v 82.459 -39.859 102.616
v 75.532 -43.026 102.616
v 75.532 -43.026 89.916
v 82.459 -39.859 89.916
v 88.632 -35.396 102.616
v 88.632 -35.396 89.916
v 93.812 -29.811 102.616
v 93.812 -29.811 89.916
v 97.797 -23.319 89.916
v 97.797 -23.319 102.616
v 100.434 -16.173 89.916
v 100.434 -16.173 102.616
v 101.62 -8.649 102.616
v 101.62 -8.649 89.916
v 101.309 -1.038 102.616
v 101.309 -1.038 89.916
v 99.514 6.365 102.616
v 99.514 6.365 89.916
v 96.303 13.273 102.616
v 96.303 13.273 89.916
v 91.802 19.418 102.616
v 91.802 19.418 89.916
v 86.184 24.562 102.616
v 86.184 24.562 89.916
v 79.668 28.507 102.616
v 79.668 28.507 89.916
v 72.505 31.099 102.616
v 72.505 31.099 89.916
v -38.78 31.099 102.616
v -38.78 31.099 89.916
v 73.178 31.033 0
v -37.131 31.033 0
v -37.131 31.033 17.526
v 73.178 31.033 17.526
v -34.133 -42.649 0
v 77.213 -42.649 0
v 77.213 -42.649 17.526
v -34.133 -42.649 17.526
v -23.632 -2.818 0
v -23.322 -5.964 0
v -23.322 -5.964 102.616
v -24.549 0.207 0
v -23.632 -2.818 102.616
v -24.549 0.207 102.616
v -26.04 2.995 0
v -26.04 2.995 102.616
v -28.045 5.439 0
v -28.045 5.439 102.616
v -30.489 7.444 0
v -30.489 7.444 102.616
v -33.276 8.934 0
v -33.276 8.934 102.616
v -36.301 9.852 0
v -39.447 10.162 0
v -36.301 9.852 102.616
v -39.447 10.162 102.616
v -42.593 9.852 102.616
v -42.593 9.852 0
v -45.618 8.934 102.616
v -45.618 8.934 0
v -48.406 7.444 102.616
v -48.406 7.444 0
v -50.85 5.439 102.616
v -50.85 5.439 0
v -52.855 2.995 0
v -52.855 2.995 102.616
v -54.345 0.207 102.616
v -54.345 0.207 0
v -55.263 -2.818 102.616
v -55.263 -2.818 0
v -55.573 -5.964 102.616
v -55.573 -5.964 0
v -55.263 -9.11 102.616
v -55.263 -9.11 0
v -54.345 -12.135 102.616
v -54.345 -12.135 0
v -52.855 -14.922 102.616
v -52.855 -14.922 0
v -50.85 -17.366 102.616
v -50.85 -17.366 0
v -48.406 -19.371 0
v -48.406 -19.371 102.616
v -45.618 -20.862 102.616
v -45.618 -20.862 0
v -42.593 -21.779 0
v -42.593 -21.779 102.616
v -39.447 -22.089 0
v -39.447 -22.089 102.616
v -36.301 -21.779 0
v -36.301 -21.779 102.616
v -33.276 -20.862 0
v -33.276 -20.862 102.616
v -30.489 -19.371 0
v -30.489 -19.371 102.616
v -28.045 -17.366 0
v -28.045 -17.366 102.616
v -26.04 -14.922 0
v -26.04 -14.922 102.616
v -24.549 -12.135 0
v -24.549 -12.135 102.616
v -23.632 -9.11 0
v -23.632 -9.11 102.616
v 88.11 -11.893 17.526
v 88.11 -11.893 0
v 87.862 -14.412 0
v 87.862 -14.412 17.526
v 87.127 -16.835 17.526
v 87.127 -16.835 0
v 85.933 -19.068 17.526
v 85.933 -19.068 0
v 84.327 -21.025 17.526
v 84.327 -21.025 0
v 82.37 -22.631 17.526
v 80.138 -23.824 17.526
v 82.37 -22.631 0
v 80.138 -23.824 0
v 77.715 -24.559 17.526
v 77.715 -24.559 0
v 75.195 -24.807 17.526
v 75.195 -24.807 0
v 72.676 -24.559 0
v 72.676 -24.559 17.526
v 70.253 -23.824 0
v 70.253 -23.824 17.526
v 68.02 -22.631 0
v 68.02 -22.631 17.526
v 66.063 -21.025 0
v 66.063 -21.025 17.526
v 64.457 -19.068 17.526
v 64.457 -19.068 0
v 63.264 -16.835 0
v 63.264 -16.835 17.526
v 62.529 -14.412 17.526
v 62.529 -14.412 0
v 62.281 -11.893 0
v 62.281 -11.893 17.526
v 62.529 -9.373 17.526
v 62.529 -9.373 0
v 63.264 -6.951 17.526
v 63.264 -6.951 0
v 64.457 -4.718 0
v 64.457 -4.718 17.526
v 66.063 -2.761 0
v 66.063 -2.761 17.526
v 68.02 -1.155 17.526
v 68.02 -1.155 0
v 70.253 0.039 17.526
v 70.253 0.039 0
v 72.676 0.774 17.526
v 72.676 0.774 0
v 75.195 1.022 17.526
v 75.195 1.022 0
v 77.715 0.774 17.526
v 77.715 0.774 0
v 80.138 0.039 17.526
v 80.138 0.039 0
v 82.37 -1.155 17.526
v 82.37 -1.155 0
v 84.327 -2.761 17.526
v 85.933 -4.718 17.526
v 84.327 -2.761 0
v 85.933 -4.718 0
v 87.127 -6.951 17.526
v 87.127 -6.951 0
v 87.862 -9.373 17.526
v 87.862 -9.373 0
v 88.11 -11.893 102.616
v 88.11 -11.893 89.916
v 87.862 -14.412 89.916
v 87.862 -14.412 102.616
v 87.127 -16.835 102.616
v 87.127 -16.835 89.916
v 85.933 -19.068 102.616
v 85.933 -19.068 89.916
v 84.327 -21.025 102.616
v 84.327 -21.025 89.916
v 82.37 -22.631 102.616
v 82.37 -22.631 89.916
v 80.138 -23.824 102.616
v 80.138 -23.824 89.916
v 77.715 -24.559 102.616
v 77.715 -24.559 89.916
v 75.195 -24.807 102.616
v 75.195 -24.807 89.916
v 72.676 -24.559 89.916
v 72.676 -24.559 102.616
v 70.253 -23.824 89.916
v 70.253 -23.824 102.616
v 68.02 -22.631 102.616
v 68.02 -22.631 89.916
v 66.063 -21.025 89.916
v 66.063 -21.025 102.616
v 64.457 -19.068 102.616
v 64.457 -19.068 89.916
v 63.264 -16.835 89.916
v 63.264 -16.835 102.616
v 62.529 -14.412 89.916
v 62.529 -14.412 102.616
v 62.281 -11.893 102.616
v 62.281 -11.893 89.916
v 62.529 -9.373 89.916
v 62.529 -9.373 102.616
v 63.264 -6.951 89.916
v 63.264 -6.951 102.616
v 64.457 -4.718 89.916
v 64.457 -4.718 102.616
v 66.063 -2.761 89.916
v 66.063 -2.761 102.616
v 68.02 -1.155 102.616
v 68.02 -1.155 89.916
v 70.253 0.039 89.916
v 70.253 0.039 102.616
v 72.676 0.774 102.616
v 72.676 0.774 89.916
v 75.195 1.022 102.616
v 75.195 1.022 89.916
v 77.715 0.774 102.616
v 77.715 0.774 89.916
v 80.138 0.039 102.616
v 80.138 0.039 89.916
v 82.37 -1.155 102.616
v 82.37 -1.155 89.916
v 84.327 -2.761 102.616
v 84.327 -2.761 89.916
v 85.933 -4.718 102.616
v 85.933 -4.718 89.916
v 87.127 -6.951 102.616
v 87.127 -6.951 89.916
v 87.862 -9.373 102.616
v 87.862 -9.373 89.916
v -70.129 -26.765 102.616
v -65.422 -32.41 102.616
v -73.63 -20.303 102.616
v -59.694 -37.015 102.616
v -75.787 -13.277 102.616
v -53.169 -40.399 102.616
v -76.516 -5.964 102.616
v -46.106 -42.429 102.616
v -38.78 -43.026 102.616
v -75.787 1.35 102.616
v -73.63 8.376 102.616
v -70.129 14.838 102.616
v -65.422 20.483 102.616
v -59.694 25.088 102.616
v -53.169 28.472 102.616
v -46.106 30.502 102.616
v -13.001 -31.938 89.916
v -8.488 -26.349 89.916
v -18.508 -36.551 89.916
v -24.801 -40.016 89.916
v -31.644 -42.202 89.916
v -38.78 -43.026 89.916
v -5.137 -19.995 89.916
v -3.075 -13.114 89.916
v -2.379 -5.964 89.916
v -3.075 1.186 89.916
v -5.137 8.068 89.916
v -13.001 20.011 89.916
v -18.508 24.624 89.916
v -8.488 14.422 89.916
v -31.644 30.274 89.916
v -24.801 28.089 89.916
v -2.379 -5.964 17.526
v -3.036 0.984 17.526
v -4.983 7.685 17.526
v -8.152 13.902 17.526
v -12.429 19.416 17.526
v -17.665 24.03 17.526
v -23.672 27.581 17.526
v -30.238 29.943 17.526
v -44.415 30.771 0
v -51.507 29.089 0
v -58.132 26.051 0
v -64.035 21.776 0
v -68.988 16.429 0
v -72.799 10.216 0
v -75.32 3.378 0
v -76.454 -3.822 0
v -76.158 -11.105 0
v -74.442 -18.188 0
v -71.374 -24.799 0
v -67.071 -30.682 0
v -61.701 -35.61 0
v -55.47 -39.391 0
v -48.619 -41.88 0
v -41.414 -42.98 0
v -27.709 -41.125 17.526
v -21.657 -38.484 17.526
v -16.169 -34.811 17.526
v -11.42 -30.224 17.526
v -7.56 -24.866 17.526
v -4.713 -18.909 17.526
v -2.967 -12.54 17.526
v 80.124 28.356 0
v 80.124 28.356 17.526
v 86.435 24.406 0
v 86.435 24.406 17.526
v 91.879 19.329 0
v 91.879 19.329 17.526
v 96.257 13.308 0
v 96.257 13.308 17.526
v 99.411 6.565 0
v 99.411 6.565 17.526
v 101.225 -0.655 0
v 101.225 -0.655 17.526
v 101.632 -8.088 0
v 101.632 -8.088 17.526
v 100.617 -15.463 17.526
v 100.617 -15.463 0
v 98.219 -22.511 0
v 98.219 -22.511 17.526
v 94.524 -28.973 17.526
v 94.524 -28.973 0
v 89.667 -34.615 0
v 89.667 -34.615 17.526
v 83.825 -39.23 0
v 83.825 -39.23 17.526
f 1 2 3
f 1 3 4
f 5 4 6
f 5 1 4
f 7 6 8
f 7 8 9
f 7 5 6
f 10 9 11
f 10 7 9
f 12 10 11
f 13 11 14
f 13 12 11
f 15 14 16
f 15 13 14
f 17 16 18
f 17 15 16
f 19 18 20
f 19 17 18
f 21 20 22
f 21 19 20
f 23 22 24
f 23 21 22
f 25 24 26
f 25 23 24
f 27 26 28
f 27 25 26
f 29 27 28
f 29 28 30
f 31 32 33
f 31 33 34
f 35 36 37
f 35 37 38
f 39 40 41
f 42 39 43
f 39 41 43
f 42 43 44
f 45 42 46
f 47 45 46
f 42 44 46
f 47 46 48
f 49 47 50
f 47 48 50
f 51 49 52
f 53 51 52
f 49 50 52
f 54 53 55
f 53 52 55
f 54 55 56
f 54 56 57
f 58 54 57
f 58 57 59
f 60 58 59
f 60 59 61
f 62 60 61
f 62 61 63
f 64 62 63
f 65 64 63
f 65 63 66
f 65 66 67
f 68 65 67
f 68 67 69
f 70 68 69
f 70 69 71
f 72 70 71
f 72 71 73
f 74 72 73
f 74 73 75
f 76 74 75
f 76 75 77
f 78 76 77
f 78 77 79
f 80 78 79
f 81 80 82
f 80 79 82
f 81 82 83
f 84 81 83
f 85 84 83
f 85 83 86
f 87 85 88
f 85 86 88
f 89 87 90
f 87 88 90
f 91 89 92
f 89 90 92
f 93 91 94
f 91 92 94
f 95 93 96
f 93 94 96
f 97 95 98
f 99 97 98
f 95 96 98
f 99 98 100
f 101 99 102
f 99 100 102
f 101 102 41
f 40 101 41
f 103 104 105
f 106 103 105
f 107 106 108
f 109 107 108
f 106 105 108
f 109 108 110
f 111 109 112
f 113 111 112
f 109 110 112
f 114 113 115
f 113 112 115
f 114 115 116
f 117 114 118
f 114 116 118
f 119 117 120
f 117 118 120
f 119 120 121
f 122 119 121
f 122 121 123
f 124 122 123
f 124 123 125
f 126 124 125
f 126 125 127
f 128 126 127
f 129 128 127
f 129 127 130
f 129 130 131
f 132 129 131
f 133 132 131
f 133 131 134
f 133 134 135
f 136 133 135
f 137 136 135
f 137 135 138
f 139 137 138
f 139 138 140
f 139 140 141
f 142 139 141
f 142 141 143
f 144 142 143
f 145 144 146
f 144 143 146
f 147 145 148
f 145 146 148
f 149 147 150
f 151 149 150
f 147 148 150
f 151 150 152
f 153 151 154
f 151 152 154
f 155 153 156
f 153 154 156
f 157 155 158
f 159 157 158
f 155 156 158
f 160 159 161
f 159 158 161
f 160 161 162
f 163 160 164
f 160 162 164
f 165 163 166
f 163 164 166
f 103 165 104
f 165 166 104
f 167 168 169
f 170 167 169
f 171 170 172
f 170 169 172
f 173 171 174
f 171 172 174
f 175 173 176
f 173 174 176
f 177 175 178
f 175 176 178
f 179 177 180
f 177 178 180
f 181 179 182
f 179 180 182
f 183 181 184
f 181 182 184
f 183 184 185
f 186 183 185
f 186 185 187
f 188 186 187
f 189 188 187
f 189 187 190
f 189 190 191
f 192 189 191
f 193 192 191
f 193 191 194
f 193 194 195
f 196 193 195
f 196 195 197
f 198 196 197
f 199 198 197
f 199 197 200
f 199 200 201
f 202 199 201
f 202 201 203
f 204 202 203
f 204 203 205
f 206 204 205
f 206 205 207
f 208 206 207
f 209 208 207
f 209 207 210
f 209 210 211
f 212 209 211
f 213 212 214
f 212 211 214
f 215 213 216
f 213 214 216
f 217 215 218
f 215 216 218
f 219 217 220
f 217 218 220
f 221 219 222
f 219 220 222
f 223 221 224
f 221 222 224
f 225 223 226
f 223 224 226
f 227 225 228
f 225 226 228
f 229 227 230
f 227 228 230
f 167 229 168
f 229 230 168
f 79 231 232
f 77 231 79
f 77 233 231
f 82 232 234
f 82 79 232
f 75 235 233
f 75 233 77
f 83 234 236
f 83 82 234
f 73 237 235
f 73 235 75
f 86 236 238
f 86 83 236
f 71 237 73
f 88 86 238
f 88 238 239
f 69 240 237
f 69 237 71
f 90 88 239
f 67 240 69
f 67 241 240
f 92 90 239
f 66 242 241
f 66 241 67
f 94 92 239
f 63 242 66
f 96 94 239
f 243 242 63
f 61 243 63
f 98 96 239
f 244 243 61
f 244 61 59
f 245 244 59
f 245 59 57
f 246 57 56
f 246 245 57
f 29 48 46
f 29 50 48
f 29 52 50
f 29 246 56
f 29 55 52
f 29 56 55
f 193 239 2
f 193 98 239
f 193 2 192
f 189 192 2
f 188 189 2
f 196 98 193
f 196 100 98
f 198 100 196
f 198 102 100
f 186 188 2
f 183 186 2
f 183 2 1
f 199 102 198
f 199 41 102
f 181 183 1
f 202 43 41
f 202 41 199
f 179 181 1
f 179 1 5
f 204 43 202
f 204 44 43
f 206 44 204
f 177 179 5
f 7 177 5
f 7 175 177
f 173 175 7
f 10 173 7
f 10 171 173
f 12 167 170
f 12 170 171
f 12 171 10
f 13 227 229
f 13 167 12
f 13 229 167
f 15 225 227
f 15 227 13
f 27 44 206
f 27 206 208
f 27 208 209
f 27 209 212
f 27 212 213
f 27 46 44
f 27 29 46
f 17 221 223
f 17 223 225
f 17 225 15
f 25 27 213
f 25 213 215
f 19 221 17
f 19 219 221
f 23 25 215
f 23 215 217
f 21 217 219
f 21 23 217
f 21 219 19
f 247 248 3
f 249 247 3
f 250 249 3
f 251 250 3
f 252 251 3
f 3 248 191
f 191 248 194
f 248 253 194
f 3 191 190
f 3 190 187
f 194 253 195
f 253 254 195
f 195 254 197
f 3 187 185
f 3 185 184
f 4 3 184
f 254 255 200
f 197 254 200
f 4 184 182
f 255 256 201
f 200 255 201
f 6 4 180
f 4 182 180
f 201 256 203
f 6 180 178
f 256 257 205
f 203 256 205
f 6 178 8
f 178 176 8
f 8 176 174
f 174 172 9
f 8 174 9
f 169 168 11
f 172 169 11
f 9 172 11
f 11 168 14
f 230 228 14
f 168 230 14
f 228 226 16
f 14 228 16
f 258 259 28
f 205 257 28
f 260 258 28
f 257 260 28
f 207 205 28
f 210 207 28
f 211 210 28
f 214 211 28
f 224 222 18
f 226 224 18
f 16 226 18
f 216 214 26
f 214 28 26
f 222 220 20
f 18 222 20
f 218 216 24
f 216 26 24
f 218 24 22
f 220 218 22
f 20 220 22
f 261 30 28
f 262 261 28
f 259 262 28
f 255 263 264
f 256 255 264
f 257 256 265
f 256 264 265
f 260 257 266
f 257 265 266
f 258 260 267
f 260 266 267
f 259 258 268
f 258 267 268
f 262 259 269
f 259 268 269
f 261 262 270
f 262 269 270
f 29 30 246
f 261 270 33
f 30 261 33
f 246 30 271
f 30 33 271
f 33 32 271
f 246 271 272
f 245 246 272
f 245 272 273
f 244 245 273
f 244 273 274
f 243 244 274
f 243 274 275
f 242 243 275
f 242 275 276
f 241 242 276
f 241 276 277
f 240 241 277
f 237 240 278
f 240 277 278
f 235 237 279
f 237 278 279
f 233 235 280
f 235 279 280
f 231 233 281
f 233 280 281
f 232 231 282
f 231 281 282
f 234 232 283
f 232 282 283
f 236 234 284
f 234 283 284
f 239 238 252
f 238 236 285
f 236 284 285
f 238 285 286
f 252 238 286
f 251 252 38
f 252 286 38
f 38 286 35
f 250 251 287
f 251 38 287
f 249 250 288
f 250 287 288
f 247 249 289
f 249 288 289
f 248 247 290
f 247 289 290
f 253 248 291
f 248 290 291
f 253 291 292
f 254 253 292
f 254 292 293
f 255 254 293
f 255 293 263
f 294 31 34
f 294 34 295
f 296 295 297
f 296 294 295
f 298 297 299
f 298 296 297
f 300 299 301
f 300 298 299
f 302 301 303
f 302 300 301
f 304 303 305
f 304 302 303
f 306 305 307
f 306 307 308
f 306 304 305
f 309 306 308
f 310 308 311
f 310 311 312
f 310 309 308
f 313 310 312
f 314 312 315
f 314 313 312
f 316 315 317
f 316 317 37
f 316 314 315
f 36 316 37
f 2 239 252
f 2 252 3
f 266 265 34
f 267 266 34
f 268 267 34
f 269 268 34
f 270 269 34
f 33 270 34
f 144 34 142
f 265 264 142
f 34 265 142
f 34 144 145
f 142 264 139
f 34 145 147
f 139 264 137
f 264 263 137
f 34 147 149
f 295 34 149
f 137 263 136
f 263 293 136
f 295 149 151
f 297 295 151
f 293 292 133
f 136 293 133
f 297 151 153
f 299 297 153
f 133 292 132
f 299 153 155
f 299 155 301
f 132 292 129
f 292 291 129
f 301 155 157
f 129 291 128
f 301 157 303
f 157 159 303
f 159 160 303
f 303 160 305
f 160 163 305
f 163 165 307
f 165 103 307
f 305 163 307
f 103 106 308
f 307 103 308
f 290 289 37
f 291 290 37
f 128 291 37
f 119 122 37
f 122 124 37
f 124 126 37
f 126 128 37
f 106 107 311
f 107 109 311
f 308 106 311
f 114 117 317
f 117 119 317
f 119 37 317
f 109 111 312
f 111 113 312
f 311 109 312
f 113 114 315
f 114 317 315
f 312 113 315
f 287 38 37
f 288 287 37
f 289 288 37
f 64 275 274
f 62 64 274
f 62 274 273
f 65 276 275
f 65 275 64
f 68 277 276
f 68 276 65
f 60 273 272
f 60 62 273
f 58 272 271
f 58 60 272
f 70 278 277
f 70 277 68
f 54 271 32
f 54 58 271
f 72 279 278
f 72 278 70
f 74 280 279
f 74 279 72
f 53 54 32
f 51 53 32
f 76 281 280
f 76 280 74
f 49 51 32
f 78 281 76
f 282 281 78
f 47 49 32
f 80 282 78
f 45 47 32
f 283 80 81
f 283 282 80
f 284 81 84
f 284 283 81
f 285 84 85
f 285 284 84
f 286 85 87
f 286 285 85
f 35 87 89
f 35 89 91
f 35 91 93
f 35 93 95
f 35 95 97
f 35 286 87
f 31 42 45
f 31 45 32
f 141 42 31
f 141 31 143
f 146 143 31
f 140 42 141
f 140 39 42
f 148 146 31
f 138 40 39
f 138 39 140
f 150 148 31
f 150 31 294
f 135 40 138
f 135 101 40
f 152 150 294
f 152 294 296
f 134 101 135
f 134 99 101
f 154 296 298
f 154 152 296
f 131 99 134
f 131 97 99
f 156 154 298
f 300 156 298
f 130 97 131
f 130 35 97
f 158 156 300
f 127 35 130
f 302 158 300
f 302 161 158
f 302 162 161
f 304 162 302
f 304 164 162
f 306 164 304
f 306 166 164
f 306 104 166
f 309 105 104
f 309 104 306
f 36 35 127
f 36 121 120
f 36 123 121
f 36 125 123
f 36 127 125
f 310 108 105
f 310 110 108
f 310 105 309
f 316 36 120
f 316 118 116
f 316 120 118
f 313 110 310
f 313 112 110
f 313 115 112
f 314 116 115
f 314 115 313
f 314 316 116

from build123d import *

# Parameters (mm, degrees)
F0_R     = 37.0686538278
F1_DEPTH = 102.616
F2_R     = 16.1254555479
F3_DEPTH = 147.828
F5_DEPTH = 12.7
F7_DEPTH = 17.526
F8_R     = 12.9146046276
F9_DEPTH = 296.926


with BuildPart() as f1:
    # F0 (on Top) → F1 (new body)
    with BuildSketch(Plane.XY):
        with Locations((-39.4473746419, -5.9636109509)):
            Circle(F0_R)
    extrude(amount=F1_DEPTH)

    # F2 (on face) → F3 (cut)
    with BuildSketch(Plane.XY.offset(102.616)):
        with Locations((-39.4473746419, -5.9636109509)):
            Circle(F2_R)
    extrude(amount=-F3_DEPTH, mode=Mode.SUBTRACT)

    # F4 (on face) → F5 (join)
    with BuildSketch(Plane.XY.offset(102.616)):
        with BuildLine():
            Line((72.5051784355, 31.0990400833), (-38.7802952426, 31.0990400833))
            ThreePointArc((-38.7802952426, 31.0990400833), (-13.0010815941, 20.0109666326), (-2.3787208141, -5.9636109509))
            ThreePointArc((-2.3787208141, -5.9636109509), (-13.0010815941, -31.9381885343), (-38.7802952426, -43.026261985))
            Line((-38.7802952426, -43.026261985), (75.5315870047, -43.026261985))
            ThreePointArc((75.5315870047, -43.026261985), (101.6520252983, -4.8353768612), (72.5051784355, 31.0990400833))
        make_face()
    extrude(amount=-F5_DEPTH)

    # F6 (on face) → F7 (join)
    with BuildSketch(Plane(origin=(0, 0, 0), x_dir=(1, 0, 0), z_dir=(0, 0, -1))):
        with BuildLine():
            Line((77.2129268269, 42.6493844966), (-34.133325719, 42.6493844966))
            ThreePointArc((-34.133325719, 42.6493844966), (-11.4199796813, 30.2236651208), (-2.3787208141, 5.9636109509))
            ThreePointArc((-2.3787208141, 5.9636109509), (-12.4294067676, -19.4158001643), (-37.1312376734, -31.0326132639))
            Line((-37.1312376734, -31.0326132639), (73.1777138929, -31.0326132639))
            ThreePointArc((73.1777138929, -31.0326132639), (101.6060825642, 4.3619936552), (77.2129268269, 42.6493844966))
        make_face()
    extrude(amount=-F7_DEPTH)

    # F8 (on face) → F9 (cut)
    with BuildSketch(Plane(origin=(0, 0, 0), x_dir=(1, 0, 0), z_dir=(0, 0, -1))):
        with Locations((75.1953125, 11.8927843869)):
            Circle(F8_R)
    extrude(amount=-F9_DEPTH, mode=Mode.SUBTRACT)


solid = f1.part
